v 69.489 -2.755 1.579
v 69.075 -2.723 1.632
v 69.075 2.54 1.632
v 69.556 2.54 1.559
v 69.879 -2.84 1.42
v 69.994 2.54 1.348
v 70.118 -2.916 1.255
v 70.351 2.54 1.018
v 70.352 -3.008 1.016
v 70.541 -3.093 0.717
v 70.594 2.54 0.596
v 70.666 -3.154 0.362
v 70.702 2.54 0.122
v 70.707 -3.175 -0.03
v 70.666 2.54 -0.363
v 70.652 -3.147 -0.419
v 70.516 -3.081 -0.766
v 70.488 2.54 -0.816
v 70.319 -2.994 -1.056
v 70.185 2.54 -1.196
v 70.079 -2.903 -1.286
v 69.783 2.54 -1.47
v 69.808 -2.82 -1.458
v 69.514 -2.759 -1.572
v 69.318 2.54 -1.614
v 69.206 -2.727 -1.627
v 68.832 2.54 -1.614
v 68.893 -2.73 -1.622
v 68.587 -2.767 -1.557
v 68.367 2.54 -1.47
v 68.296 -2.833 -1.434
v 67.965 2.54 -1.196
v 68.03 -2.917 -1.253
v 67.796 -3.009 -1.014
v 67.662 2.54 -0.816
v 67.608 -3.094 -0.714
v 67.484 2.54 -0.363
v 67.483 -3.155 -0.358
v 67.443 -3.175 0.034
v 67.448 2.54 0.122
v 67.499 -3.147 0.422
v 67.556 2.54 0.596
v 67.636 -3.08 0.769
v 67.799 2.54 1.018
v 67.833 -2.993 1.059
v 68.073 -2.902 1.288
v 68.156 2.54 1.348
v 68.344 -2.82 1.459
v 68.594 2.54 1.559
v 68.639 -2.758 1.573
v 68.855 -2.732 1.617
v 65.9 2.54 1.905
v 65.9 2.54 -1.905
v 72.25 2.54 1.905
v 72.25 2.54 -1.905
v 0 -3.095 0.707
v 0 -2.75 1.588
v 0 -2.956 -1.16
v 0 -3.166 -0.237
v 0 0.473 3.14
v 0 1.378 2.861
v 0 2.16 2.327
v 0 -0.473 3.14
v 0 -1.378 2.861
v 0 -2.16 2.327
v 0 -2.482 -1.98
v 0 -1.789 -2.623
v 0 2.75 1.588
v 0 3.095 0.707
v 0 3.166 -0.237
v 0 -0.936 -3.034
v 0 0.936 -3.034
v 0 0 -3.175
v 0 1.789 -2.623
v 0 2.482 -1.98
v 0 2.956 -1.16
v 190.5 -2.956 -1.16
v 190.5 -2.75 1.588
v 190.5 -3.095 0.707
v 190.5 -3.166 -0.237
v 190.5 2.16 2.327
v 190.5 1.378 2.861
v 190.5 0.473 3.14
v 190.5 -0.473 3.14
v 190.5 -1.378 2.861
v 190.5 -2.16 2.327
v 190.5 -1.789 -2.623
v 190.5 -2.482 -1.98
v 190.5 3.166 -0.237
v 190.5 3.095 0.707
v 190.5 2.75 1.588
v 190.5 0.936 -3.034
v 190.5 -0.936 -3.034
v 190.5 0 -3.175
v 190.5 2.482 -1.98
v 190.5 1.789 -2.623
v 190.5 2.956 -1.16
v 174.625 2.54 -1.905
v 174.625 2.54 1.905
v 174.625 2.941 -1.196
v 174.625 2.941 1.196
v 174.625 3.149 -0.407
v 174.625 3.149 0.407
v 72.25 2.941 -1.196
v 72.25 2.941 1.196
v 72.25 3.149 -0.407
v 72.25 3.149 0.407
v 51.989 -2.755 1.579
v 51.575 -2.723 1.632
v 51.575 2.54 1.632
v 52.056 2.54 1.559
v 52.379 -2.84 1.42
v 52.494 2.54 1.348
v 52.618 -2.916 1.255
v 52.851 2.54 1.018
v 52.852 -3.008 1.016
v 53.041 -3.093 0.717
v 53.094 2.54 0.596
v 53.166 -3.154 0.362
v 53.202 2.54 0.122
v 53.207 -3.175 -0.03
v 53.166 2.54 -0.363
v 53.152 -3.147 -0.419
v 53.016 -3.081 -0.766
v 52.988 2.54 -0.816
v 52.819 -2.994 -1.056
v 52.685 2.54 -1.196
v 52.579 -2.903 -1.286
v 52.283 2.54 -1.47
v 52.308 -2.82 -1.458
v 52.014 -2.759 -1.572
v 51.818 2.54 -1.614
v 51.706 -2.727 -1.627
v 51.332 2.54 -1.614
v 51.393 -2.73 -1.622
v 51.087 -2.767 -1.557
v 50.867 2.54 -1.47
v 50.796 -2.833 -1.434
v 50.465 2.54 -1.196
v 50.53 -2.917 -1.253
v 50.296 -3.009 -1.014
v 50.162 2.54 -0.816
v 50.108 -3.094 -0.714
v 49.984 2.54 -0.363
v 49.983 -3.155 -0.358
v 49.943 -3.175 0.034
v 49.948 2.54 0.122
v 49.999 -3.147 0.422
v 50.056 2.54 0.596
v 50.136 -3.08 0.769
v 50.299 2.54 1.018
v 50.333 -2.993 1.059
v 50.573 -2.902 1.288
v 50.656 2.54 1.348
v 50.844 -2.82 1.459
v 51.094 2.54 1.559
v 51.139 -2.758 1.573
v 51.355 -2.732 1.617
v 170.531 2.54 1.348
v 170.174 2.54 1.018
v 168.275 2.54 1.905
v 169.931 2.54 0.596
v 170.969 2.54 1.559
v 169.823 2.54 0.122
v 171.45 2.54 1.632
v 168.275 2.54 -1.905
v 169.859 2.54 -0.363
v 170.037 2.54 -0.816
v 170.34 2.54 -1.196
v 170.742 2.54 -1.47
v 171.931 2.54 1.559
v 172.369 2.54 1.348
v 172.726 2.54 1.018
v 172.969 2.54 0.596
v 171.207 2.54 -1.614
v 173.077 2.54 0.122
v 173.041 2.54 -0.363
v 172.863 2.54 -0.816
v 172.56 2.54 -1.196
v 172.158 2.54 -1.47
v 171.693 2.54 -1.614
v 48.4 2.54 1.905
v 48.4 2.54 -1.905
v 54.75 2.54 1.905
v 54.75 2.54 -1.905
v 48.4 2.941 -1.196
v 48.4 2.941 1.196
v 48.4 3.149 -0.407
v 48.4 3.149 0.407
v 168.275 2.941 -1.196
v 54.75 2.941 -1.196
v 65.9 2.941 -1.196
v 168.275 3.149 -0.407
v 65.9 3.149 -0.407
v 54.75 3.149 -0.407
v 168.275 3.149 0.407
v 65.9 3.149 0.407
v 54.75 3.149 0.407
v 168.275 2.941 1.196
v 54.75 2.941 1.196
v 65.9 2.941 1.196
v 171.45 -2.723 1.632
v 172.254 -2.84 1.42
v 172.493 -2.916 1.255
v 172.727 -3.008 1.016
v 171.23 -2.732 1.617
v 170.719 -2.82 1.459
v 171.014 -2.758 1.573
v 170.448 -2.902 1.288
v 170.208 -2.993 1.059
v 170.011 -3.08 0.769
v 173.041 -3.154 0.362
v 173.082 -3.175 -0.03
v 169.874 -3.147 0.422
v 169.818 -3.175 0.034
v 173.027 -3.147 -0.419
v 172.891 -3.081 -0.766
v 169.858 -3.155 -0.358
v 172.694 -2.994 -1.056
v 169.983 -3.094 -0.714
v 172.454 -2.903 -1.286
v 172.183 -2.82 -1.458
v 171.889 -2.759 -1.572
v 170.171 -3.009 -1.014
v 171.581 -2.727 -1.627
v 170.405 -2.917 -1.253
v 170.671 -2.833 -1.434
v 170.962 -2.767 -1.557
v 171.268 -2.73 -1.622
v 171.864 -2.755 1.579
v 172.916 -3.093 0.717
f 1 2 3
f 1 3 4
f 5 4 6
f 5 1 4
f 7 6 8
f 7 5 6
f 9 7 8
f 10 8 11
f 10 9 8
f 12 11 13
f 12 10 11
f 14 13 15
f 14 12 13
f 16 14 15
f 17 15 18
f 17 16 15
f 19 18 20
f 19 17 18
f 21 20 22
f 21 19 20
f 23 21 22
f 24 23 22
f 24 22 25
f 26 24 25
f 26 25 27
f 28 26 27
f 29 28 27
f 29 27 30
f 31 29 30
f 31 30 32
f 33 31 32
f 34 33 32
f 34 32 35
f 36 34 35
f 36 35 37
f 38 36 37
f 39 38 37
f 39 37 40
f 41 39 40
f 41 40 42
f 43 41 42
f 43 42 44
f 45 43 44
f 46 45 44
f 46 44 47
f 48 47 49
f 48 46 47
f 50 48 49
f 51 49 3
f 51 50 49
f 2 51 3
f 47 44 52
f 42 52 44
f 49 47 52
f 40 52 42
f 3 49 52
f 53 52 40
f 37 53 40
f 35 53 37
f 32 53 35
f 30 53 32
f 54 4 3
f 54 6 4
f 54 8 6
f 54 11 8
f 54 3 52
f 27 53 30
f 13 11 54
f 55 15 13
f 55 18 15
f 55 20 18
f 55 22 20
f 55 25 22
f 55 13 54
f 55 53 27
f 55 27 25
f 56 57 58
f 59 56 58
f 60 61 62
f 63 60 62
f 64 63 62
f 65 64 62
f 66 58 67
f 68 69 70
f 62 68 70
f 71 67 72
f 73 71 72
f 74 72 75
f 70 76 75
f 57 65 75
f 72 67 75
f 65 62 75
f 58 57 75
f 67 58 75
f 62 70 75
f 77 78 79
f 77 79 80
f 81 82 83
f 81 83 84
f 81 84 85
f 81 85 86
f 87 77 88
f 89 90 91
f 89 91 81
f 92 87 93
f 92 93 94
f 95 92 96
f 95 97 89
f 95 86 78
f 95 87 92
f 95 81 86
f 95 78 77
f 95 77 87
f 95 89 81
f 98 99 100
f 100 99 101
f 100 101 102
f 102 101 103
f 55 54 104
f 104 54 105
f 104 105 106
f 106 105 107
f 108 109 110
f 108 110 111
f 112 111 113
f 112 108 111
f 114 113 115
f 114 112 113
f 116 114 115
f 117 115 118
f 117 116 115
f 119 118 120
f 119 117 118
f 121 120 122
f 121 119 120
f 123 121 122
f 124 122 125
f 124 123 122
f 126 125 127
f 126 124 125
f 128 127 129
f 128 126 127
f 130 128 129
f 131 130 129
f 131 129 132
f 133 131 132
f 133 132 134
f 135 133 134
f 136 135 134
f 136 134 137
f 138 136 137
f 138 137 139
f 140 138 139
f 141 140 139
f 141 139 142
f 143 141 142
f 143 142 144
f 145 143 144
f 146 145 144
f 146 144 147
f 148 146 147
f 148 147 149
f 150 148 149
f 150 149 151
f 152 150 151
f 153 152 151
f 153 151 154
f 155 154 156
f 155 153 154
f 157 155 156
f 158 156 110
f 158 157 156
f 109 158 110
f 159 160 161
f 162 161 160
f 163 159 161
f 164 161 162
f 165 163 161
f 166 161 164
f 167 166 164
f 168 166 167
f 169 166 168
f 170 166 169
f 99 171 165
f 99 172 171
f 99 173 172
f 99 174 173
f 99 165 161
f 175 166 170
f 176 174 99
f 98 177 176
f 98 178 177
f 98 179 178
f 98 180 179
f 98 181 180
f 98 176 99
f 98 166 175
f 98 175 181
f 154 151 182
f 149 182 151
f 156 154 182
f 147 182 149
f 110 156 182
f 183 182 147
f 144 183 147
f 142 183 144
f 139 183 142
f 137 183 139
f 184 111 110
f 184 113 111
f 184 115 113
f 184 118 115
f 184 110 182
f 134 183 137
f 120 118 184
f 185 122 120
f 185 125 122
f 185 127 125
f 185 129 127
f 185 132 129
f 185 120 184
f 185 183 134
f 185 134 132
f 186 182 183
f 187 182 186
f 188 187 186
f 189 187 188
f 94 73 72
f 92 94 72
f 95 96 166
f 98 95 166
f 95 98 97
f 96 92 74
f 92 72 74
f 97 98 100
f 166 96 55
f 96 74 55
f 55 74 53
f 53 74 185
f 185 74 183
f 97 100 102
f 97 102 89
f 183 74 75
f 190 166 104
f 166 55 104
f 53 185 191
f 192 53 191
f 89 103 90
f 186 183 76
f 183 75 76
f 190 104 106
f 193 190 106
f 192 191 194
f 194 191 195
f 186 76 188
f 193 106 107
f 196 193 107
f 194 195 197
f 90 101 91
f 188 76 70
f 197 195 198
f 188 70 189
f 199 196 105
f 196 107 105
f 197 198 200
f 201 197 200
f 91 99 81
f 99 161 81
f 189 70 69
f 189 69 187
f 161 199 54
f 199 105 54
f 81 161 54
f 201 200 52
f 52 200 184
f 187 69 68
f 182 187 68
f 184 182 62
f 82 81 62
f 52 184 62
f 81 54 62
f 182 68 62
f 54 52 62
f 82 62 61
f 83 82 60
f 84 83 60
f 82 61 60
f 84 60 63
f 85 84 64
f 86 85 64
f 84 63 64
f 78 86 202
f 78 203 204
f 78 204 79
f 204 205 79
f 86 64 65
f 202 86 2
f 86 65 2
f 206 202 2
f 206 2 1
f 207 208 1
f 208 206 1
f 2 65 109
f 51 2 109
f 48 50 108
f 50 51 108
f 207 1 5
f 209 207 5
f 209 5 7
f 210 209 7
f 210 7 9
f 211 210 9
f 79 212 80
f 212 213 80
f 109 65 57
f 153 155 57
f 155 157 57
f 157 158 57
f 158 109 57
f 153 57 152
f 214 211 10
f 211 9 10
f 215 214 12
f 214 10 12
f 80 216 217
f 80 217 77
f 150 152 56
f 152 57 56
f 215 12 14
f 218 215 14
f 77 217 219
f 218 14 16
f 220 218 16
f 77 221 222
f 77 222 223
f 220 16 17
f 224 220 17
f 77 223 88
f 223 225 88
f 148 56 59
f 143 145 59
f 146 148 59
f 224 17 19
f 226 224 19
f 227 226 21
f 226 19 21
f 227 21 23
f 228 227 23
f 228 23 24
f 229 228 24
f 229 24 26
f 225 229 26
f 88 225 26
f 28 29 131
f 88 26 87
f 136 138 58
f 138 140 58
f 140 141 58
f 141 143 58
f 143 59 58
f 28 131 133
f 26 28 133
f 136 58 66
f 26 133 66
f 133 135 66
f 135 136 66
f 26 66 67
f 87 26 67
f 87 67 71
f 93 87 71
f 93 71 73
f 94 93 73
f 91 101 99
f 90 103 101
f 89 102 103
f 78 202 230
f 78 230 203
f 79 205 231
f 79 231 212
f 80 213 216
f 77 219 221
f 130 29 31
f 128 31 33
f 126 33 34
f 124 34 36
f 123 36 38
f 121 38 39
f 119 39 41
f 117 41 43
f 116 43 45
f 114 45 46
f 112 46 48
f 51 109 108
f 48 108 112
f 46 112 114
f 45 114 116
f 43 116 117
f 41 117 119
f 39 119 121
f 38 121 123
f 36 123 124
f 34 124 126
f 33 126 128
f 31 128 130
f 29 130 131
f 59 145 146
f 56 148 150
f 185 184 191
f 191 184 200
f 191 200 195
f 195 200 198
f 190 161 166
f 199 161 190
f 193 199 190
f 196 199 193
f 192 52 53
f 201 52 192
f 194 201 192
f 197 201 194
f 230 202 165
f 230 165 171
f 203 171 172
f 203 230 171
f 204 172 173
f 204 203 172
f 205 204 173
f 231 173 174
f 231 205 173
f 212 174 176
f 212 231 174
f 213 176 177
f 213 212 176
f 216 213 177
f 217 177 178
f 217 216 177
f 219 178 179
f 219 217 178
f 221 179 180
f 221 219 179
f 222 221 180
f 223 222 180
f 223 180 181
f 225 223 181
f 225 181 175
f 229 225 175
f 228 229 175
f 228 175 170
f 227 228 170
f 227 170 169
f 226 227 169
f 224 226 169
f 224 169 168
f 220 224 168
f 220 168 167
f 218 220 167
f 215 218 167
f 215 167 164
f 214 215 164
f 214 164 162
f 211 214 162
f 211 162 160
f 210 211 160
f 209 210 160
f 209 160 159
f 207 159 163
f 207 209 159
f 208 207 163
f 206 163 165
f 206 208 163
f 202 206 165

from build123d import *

# Parameters (mm, degrees)
SKETCH1_R               = 3.175
BOSS_EXTRUDE1_DEPTH     = 190.5
CUT_EXTRUDE1_DEPTH      = 191.552909319
CUT_EXTRUDE1_DEPTH_BACK = 191.552909319
SKETCH2_R               = 1.63195
CUT_EXTRUDE2_START      = 2.54
SKETCH2_3_W             = 6.35
SKETCH2_3_H             = 11.745313468
SKETCH2_3_R             = 1.63195
SKETCH2_3_H_2           = 14.521129012
CUT_EXTRUDE2_DEPTH      = 189.012909422


with BuildPart() as part:
    # Sketch1 → Boss-Extrude1 (new body)
    with BuildSketch(Plane(origin=(0, 0, 0), x_dir=(0, 0, -1), z_dir=(1, 0, 0))):
        Circle(SKETCH1_R)
    extrude(amount=BOSS_EXTRUDE1_DEPTH)

    # Sketch2 → Cut-Extrude1 (cut, two sides: drawn at the far end of the back side and taken through both)
    with BuildSketch(Plane(origin=(0, 0, 0), x_dir=(1, 0, 0), z_dir=(0, 1, 0)).offset(-CUT_EXTRUDE1_DEPTH_BACK)):
        with Locations((171.45, 0)):
            Circle(SKETCH2_R)
        with Locations((51.575, 0)):
            Circle(SKETCH2_R)
        with Locations((69.075, 0)):
            Circle(SKETCH2_R)
    extrude(amount=CUT_EXTRUDE1_DEPTH + CUT_EXTRUDE1_DEPTH_BACK, mode=Mode.SUBTRACT)

    # Sketch2<3> → Cut-Extrude2 (cut, through all)
    # profile 1 of 3: a face of its own
    with BuildSketch(Plane(origin=(0, 0, 0), x_dir=(1, 0, 0), z_dir=(0, 1, 0)).offset(CUT_EXTRUDE2_START)):
        with Locations((69.075, 0)):
            Rectangle(SKETCH2_3_W, SKETCH2_3_H)
        with Locations((69.075, 0)):
            Circle(SKETCH2_3_R, mode=Mode.SUBTRACT)
    # profile 2 of 3: a face of its own
    with BuildSketch(Plane(origin=(0, 0, 0), x_dir=(1, 0, 0), z_dir=(0, 1, 0)).offset(CUT_EXTRUDE2_START)):
        with Locations((51.575, 0)):
            Rectangle(SKETCH2_3_W, SKETCH2_3_H)
        with Locations((51.575, 0)):
            Circle(SKETCH2_3_R, mode=Mode.SUBTRACT)
    # profile 3 of 3: a face of its own
    with BuildSketch(Plane(origin=(0, 0, 0), x_dir=(1, 0, 0), z_dir=(0, 1, 0)).offset(CUT_EXTRUDE2_START)):
        with Locations((171.45, 0)):
            Rectangle(SKETCH2_3_W, SKETCH2_3_H_2)
        with Locations((171.45, 0)):
            Circle(SKETCH2_3_R, mode=Mode.SUBTRACT)
    extrude(amount=CUT_EXTRUDE2_DEPTH, mode=Mode.SUBTRACT)


solid = part.part
